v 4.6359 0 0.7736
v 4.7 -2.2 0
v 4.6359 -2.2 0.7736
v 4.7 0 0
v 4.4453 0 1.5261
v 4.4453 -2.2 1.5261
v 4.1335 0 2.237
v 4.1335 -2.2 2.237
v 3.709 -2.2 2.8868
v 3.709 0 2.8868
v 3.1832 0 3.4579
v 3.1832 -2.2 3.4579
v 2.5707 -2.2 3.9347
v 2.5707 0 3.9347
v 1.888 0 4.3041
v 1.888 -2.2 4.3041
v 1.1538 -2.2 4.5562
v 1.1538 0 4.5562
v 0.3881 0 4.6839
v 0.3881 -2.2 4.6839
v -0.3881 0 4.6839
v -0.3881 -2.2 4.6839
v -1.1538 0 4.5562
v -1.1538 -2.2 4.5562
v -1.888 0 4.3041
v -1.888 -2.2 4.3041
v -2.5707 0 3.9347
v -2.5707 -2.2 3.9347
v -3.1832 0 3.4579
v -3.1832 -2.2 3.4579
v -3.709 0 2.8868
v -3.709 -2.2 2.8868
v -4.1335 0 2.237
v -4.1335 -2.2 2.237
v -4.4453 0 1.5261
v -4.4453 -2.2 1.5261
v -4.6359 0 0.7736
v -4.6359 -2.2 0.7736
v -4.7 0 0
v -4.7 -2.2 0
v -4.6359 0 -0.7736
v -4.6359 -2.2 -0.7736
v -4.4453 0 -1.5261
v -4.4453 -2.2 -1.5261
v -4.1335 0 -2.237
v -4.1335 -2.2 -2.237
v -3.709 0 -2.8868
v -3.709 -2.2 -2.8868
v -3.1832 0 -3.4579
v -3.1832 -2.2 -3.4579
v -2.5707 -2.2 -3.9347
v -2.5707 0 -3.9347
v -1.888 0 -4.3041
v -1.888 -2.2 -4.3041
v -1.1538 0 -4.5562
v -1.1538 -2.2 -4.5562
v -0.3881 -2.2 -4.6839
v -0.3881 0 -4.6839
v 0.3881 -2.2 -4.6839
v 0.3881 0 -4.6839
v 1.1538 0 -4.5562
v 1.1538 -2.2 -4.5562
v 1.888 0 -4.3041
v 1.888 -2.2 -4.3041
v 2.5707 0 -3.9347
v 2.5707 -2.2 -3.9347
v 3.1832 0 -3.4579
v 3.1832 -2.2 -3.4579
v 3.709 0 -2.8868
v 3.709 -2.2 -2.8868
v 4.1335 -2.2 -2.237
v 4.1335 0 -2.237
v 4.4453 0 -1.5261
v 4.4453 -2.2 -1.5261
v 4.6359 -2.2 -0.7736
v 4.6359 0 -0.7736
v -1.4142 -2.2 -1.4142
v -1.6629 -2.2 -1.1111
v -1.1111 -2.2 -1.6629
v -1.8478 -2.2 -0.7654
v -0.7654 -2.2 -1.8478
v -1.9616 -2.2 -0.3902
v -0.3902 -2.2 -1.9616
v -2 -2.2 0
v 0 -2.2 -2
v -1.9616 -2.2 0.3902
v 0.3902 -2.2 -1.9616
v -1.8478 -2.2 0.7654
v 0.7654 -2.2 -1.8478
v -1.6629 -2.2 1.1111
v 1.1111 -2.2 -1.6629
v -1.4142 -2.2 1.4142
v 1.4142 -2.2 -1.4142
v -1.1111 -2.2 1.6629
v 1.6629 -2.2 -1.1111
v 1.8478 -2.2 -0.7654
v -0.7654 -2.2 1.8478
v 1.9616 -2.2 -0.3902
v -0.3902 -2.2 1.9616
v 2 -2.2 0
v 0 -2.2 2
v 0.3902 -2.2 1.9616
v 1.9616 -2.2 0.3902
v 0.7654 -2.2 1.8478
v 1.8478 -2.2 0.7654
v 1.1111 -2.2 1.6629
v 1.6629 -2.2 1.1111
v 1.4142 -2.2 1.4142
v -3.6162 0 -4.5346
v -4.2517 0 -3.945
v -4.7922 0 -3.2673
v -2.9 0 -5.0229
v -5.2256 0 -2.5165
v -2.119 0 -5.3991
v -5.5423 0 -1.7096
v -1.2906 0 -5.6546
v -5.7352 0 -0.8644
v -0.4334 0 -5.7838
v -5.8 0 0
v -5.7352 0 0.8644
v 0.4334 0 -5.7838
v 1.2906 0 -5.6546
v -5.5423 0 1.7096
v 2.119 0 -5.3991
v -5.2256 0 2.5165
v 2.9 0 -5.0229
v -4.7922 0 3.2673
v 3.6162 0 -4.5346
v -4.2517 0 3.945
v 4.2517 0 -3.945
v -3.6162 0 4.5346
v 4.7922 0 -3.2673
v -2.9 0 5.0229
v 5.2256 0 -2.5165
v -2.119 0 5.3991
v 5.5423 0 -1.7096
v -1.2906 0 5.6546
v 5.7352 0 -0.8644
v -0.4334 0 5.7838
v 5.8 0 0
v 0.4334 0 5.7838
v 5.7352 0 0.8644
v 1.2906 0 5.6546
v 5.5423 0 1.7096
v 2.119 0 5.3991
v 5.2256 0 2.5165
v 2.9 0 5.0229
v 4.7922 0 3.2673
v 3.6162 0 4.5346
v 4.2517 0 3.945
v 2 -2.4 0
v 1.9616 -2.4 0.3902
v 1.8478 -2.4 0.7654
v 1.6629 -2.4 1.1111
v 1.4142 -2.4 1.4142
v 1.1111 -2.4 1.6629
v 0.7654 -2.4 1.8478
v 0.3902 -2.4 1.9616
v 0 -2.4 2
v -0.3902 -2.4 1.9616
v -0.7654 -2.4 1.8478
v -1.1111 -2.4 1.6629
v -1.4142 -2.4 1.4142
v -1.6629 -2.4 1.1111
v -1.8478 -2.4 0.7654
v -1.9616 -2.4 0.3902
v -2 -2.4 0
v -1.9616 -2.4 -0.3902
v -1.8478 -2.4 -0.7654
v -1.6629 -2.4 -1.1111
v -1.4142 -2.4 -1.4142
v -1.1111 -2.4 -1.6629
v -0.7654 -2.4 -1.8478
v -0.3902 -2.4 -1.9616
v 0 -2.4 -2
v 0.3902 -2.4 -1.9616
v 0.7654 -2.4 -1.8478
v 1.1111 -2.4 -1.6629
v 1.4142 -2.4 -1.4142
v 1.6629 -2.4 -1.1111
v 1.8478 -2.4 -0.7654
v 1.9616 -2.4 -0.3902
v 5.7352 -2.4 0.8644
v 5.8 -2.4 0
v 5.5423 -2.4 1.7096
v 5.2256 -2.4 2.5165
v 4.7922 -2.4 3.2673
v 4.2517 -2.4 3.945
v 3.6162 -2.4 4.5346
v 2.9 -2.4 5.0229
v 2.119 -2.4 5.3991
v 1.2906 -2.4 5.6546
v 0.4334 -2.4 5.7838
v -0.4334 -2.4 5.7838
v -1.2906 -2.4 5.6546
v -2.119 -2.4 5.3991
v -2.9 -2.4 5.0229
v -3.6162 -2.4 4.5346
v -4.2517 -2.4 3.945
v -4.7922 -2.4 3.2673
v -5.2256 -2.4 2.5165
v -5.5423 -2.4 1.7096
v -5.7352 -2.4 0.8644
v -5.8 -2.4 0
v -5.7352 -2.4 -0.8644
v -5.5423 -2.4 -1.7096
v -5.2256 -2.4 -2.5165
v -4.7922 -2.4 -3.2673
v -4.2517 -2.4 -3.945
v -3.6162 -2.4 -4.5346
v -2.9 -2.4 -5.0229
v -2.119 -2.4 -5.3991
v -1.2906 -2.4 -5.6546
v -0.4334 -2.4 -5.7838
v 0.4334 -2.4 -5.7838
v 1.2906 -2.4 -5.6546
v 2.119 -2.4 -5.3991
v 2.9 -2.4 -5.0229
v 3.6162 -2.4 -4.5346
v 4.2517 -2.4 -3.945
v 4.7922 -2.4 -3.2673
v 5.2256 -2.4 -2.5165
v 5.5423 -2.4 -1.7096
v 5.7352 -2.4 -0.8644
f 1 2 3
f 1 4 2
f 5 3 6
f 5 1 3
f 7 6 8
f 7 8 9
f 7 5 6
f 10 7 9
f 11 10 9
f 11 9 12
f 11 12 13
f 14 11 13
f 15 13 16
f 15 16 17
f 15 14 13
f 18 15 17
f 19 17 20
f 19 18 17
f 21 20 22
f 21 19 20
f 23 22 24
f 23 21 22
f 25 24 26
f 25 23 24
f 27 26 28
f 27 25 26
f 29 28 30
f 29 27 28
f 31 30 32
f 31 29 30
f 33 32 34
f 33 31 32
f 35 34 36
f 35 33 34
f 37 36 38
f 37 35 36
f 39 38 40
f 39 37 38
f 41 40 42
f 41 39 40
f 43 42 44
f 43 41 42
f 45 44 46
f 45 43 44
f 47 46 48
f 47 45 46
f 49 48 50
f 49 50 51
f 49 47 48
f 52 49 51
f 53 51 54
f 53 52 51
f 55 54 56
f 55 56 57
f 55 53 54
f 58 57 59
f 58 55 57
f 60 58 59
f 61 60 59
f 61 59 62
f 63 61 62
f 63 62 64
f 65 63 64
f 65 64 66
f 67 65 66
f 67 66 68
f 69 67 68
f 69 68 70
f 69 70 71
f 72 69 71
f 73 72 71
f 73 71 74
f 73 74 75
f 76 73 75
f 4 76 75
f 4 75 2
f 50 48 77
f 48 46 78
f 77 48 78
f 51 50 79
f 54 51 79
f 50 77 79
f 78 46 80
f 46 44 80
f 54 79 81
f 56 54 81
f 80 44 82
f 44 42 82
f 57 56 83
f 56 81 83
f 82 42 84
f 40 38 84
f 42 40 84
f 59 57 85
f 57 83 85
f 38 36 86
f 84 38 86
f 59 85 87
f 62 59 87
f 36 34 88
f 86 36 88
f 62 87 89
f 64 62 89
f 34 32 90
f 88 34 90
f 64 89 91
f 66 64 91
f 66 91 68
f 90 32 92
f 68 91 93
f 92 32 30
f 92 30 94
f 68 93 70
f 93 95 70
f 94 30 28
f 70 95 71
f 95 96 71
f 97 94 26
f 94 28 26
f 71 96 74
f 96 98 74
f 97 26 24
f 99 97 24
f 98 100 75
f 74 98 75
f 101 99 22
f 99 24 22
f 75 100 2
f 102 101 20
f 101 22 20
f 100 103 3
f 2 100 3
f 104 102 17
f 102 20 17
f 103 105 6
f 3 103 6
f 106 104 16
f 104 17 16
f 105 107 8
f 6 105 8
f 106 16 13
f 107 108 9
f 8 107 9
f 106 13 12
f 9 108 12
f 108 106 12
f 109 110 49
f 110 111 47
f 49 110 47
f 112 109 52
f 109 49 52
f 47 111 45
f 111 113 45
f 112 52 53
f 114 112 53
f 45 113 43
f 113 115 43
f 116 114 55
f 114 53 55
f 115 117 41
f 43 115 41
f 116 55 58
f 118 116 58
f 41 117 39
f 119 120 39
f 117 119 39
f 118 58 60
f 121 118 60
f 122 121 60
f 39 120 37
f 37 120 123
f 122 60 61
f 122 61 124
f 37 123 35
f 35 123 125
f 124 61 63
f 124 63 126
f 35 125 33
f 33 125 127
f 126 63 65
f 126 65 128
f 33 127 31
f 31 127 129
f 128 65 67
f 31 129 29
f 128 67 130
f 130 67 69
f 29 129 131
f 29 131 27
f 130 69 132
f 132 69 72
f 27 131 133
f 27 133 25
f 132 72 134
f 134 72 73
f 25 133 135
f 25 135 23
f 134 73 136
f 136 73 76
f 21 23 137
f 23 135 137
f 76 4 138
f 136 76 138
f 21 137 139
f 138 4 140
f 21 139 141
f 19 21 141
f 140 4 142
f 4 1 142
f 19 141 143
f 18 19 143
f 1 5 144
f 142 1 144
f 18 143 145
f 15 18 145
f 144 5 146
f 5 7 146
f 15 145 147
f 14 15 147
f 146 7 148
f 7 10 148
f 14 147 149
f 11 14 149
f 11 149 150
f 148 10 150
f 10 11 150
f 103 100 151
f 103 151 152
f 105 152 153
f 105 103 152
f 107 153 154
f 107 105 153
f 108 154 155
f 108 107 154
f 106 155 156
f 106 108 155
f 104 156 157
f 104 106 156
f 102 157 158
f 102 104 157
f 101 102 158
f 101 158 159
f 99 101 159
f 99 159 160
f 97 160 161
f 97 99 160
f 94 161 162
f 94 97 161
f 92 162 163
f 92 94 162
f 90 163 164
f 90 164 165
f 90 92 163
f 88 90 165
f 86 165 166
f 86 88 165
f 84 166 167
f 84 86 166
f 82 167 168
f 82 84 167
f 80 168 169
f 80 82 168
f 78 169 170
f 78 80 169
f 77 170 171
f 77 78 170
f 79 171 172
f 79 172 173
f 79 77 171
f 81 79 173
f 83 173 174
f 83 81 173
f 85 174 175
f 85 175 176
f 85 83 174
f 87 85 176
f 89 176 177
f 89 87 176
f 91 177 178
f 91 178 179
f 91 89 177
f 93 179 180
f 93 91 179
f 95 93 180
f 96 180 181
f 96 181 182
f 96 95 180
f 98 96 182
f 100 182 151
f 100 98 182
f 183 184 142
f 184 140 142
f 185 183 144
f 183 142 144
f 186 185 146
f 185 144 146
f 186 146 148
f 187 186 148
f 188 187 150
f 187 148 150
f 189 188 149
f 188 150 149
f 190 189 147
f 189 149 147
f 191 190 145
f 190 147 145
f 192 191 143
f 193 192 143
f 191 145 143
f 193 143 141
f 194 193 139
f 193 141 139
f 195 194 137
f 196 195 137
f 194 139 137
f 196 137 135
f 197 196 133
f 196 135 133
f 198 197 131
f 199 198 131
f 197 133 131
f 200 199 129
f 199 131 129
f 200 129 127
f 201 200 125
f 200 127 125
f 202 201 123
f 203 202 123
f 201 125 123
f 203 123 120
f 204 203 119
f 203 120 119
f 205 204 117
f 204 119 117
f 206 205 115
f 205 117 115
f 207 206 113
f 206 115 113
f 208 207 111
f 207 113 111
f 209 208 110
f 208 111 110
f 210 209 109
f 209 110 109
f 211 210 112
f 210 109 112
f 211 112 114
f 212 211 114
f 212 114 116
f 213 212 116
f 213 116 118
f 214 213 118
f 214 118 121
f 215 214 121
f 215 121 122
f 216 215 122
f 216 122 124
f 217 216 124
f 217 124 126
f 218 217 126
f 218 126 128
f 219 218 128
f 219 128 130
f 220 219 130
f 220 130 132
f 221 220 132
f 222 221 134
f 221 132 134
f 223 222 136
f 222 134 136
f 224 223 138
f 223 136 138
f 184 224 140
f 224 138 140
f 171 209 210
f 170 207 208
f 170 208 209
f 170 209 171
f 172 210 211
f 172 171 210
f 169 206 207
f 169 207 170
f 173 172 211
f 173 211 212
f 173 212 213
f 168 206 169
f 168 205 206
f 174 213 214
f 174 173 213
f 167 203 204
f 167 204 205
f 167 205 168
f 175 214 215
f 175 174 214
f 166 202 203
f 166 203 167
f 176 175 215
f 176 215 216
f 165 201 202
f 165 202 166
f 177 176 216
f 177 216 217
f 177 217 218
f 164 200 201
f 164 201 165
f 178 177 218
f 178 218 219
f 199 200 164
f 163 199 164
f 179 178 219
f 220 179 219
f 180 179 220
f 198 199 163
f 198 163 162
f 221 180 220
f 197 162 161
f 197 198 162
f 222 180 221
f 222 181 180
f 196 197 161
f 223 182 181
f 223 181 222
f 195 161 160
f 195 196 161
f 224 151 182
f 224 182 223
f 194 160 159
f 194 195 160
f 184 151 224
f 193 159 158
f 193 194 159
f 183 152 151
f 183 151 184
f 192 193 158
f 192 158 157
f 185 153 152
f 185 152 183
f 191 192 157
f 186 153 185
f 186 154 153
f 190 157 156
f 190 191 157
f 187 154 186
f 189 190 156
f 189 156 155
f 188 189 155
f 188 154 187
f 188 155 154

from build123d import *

# Parameters (mm, degrees)
F0_R     = 5.8
F1_DEPTH = 1.8
F2_R     = 5.8
F2_R_2   = 4.7
F3_DEPTH = 0.4
F4_R     = 4.7
F5_DEPTH = 1.8
F6_R     = 5.8
F6_R_2   = 4.7
F6_R_3   = 2
F7_DEPTH = 0.2


# Not quite as in the source:
# - a feature names something its author has since deleted; it is built from what else it names


with BuildPart() as f1:
    # F0 (on Front) → F1 (new body)
    with BuildSketch(Plane.XZ):
        Circle(F0_R)
    extrude(amount=F1_DEPTH)

    # F2 (on face) → F3 (join)
    with BuildSketch(Plane.XZ.offset(1.8)):
        Circle(F2_R)
        Circle(F2_R_2, mode=Mode.SUBTRACT)
    extrude(amount=F3_DEPTH)

    # F4 (on face) → F5 (cut)
    with BuildSketch(Plane.XZ.offset(1.8)):
        Circle(F4_R)
    extrude(amount=-F5_DEPTH, mode=Mode.SUBTRACT)

    # F6 (on face) → F7 (join)
    with BuildSketch(Plane.XZ.offset(2.2)):
        Circle(F6_R)
        Circle(F6_R_2, mode=Mode.SUBTRACT)
        Circle(F6_R_2)
        Circle(F6_R_3, mode=Mode.SUBTRACT)
    extrude(amount=F7_DEPTH)


solid = f1.part
